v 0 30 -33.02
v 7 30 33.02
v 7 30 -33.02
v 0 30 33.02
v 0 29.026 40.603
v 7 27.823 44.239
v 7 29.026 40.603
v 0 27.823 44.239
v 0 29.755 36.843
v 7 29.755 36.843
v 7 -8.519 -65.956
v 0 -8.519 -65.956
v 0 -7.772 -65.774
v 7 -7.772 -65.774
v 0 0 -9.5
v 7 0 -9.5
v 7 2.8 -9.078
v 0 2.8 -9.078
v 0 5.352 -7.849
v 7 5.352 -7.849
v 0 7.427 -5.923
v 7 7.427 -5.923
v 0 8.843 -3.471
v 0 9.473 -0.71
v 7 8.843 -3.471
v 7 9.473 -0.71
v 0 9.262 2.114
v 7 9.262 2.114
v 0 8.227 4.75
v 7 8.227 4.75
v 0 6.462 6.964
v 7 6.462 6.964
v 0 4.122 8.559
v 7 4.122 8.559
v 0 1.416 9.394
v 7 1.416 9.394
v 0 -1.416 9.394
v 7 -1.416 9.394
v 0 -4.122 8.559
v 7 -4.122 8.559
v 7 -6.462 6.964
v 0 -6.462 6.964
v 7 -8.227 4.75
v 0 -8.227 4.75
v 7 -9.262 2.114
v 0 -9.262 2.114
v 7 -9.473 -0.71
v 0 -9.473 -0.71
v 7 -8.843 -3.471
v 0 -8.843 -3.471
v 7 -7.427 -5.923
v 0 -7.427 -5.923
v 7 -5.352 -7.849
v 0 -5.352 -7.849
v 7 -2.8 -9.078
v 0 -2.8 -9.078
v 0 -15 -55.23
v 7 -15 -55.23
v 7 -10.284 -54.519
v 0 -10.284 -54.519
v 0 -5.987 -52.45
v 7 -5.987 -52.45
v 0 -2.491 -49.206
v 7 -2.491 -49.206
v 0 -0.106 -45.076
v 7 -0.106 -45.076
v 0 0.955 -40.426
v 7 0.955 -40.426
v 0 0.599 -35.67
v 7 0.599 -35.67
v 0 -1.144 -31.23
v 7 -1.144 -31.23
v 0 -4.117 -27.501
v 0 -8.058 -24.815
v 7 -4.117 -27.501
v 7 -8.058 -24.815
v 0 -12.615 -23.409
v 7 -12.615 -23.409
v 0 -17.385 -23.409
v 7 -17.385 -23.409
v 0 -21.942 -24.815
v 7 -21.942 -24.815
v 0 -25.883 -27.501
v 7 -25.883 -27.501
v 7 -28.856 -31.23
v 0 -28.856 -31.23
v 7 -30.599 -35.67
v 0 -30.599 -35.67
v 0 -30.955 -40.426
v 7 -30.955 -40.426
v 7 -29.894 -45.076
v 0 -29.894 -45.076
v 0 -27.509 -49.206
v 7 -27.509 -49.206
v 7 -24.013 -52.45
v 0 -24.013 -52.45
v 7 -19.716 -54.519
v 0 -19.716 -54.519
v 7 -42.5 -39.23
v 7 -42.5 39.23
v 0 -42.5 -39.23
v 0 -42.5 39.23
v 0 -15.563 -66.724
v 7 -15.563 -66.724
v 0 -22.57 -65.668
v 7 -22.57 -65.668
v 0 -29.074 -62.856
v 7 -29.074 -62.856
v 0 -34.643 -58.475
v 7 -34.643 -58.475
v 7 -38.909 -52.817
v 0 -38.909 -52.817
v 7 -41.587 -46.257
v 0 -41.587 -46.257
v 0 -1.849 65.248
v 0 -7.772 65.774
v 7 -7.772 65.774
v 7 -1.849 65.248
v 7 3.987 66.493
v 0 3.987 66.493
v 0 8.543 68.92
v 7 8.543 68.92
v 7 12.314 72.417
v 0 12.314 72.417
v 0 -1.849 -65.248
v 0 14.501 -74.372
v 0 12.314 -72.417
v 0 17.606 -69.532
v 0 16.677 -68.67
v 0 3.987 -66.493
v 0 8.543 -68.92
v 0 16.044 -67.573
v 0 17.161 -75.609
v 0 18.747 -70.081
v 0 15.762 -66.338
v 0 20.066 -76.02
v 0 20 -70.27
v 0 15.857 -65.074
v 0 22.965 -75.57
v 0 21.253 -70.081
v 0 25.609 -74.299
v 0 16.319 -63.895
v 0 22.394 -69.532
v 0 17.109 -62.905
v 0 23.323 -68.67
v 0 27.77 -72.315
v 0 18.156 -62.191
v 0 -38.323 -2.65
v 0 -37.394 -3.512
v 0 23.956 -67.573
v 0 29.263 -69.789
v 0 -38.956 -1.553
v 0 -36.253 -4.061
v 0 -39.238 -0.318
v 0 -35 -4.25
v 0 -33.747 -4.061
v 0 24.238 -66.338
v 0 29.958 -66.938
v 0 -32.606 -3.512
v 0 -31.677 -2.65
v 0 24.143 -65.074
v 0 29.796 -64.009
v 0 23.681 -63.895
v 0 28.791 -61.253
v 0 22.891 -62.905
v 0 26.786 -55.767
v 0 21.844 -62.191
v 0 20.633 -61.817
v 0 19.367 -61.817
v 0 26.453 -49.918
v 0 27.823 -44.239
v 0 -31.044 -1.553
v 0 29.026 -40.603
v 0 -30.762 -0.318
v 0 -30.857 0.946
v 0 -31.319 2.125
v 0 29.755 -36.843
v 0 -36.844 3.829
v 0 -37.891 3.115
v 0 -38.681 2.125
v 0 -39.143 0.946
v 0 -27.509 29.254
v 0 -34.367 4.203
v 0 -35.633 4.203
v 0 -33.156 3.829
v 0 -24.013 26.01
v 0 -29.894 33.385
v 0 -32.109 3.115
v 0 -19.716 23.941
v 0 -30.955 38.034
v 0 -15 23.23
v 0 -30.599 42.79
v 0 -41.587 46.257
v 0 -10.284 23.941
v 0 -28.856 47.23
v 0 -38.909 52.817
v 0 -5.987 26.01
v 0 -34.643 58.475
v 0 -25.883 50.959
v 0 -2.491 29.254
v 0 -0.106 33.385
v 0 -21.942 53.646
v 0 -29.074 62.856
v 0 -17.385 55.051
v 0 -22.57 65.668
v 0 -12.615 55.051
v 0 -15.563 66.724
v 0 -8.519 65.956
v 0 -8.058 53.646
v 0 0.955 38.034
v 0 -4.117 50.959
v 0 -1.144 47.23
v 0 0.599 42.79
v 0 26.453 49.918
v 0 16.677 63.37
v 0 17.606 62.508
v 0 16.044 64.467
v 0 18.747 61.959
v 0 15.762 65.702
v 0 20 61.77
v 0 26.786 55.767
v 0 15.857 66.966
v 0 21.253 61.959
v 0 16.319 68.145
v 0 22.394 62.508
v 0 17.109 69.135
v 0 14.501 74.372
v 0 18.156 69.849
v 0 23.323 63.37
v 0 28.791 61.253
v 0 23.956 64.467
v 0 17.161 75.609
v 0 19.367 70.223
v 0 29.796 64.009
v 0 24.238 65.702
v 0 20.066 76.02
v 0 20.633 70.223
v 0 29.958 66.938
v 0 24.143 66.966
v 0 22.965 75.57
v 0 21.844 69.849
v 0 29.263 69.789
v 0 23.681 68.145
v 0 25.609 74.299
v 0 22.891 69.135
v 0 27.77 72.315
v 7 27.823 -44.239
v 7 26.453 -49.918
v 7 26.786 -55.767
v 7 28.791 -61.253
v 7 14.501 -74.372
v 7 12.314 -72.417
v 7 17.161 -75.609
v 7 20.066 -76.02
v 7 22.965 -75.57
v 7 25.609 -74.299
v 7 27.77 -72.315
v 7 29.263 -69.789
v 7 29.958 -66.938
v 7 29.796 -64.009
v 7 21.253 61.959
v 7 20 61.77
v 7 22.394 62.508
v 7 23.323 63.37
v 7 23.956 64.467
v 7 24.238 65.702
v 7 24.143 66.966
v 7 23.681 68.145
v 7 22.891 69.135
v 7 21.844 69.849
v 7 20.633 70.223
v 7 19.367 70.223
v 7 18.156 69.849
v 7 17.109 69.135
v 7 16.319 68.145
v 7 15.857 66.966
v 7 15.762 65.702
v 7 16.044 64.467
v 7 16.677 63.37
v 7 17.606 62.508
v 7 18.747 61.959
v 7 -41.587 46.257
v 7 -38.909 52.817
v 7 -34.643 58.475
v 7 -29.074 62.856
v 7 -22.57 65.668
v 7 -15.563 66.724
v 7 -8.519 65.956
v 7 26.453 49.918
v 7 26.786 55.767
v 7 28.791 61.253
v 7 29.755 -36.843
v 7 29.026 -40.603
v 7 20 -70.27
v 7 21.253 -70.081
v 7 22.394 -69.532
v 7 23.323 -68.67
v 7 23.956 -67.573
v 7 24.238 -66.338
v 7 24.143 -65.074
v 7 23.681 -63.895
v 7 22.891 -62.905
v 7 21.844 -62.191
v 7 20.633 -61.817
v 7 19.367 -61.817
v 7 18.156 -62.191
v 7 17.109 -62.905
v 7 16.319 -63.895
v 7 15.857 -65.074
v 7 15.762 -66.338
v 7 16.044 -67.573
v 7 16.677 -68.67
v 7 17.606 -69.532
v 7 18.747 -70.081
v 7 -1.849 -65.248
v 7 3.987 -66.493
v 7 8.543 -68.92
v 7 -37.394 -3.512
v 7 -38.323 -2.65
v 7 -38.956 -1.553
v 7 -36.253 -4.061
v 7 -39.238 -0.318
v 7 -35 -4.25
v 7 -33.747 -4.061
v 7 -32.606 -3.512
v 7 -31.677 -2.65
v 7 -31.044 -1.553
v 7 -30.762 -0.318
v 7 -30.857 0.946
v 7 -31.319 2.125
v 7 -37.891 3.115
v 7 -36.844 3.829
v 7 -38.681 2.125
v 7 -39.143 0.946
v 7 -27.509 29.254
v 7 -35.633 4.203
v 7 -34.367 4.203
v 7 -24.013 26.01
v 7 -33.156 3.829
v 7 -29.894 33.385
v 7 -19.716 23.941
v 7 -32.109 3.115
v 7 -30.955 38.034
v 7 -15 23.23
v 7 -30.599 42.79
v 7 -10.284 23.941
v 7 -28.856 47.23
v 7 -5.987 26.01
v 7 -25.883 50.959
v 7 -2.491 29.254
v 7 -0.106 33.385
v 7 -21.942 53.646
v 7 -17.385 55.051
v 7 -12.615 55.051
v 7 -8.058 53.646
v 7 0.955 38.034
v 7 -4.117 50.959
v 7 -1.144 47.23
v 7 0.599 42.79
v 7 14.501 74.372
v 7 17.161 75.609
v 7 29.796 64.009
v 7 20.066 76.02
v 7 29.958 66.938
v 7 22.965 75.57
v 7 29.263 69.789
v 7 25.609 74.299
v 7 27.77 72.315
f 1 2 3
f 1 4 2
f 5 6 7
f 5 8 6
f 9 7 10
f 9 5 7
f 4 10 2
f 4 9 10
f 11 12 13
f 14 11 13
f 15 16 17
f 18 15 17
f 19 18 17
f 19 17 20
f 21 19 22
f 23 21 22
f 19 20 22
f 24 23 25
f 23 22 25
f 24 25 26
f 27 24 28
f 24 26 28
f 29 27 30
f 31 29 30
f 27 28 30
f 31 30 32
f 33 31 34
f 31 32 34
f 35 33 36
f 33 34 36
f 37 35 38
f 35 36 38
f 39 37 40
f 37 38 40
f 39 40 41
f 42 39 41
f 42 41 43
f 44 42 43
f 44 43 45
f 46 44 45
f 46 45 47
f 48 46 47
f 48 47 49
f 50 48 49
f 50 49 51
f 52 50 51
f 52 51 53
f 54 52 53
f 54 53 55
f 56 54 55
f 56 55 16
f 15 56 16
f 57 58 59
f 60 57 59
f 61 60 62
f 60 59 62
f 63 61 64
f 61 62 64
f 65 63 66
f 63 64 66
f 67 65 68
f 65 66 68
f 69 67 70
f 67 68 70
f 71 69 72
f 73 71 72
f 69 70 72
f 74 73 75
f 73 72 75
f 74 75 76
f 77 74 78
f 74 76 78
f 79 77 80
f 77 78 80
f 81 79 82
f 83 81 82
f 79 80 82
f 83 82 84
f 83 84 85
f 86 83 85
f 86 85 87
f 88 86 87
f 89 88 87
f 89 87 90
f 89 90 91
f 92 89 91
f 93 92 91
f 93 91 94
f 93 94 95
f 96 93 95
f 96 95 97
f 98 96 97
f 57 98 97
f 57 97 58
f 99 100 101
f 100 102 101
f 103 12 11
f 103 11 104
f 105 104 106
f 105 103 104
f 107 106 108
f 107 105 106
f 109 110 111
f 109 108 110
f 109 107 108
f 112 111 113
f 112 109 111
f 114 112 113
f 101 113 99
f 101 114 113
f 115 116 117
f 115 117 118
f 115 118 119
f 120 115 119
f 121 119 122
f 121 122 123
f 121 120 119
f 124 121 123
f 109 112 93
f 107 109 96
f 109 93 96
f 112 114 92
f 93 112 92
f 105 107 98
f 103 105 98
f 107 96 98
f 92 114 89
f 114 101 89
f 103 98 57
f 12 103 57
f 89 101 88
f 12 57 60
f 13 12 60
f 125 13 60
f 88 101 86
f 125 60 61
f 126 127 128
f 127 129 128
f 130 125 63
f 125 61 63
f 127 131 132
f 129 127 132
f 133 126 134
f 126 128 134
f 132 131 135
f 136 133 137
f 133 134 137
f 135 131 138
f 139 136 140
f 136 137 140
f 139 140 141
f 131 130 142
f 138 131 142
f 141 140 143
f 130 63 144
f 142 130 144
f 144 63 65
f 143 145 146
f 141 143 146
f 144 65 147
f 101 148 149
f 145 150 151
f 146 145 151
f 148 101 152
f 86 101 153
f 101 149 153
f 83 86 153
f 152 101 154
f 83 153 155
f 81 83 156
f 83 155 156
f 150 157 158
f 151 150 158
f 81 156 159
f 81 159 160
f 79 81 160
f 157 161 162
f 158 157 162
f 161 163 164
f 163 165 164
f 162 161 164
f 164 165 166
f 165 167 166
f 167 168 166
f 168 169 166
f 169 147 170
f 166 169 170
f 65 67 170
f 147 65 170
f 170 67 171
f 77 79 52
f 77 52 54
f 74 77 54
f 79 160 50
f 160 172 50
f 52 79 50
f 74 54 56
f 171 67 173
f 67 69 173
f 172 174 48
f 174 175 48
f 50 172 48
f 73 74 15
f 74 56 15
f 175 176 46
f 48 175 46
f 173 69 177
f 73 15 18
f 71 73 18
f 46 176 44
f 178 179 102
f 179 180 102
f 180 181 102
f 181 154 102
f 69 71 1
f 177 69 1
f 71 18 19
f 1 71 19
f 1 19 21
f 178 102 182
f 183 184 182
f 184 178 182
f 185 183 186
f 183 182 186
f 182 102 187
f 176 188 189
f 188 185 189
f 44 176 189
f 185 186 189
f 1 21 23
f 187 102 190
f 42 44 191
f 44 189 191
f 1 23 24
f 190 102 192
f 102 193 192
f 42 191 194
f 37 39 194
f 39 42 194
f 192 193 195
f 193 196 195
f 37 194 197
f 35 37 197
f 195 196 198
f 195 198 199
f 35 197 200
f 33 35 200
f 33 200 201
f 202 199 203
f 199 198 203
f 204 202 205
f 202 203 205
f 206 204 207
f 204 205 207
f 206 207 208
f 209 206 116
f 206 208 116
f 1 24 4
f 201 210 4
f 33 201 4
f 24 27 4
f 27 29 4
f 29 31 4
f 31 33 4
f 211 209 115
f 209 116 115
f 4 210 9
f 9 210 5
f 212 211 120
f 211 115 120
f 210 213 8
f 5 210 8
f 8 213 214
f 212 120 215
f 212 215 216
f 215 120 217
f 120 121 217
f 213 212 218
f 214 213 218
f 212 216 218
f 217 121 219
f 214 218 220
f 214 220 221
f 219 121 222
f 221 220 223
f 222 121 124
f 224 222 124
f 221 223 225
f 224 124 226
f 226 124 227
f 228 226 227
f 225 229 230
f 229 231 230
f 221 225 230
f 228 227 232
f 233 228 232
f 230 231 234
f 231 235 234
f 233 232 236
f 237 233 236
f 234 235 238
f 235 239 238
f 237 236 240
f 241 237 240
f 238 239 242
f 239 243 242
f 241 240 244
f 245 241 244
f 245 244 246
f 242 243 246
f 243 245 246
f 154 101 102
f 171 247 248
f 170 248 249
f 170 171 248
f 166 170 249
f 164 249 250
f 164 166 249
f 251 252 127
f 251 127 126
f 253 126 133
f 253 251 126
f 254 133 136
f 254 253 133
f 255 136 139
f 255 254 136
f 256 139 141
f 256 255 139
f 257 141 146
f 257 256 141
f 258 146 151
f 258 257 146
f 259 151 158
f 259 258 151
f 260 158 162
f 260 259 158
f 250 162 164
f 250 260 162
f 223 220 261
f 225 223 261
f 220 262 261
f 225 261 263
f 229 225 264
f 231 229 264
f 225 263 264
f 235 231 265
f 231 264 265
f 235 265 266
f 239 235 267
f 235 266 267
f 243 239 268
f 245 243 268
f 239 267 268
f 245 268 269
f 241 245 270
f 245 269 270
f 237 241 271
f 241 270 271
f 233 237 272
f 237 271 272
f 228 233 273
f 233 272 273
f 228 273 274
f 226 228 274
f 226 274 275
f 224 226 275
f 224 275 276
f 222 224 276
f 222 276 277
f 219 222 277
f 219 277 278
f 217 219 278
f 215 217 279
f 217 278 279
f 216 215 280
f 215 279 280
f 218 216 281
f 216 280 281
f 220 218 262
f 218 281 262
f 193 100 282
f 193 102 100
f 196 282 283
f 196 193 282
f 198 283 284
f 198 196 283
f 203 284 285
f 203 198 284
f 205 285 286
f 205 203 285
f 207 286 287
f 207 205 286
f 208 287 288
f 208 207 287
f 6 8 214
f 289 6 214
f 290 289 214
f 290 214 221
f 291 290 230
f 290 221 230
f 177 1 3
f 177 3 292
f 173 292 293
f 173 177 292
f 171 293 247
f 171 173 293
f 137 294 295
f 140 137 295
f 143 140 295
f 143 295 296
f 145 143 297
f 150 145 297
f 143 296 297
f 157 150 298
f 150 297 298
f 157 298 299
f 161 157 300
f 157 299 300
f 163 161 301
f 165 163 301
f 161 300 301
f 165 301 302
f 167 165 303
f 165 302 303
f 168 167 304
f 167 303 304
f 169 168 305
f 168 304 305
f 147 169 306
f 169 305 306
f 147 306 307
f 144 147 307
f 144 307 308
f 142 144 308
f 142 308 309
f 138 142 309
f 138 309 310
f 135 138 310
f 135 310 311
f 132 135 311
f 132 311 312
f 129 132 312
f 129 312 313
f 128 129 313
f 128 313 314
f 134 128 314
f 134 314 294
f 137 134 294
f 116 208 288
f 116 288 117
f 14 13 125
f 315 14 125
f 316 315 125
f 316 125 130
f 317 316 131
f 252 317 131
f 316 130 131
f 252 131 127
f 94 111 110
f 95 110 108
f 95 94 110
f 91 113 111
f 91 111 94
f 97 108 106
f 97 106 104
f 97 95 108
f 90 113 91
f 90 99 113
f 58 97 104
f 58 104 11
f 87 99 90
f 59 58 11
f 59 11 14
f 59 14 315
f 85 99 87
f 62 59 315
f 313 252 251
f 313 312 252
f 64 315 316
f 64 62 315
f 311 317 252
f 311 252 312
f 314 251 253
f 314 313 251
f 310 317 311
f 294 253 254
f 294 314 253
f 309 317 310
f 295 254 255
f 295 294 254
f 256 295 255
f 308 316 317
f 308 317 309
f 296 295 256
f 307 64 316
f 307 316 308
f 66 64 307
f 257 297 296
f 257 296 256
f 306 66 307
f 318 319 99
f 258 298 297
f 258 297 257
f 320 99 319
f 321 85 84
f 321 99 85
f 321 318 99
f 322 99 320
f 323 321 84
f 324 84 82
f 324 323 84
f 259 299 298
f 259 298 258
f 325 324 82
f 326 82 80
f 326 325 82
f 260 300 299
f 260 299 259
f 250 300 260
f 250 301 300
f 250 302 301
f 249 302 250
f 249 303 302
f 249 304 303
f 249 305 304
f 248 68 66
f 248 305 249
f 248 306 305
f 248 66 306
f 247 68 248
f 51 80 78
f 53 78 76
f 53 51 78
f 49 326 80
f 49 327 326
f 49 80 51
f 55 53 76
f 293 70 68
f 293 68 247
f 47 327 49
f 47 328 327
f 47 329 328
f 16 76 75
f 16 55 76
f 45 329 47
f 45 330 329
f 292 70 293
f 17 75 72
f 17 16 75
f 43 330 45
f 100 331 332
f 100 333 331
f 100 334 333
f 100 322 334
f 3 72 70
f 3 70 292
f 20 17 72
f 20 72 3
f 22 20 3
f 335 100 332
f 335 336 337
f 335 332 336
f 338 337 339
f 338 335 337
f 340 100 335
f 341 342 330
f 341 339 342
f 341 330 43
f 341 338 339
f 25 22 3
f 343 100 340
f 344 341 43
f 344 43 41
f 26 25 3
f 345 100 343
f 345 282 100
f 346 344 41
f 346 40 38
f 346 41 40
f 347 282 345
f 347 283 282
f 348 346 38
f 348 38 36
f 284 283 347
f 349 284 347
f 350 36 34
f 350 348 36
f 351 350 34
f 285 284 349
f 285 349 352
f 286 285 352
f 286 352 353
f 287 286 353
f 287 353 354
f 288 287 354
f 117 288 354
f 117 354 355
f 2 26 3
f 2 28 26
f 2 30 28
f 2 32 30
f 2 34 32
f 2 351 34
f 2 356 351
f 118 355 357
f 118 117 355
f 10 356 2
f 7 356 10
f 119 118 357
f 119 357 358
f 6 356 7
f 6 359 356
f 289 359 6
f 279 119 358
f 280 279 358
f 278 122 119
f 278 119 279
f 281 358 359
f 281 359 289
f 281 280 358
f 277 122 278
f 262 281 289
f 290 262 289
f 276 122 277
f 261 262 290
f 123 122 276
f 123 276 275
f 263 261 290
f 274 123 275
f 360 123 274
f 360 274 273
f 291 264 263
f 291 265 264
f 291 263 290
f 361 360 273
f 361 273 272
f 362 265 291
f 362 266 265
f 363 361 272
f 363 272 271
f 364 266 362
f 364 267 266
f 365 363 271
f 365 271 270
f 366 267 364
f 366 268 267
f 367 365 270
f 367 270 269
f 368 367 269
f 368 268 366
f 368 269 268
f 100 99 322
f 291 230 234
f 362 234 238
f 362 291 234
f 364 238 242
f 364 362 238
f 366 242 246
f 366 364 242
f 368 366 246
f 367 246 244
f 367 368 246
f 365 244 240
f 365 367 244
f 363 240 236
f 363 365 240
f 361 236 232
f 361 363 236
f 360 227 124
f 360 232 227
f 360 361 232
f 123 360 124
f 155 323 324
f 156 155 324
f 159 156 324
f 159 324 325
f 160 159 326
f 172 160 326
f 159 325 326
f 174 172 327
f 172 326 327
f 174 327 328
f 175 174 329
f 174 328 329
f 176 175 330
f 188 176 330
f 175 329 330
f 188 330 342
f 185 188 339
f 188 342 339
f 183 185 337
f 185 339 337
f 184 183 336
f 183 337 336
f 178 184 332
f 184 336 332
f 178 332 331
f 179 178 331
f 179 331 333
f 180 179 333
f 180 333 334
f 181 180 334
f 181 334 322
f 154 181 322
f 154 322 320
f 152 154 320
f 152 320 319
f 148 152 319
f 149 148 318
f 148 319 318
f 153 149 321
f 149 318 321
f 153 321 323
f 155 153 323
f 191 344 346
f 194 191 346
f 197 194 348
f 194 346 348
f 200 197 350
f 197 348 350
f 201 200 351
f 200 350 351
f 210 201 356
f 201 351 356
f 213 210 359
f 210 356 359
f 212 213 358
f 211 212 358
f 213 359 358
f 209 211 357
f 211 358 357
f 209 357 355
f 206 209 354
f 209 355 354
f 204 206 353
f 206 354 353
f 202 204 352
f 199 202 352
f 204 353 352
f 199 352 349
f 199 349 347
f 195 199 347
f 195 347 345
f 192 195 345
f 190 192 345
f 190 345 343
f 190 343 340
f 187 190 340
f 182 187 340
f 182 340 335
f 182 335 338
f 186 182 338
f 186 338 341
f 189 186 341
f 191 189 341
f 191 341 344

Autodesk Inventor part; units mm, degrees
ref_plane "YZ Plane" through (0, 0, 0) normal (1, 0, 0) x (0, 1, 0)
ref_plane "XZ Plane" through (0, 0, 0) normal (0, 1, 0) x (-1, 0, 0)
ref_plane "XY Plane" through (0, 0, 0) normal (0, 0, 1) x (1, 0, 0)
sketch "Sketch6" plane through (0, 0, 0) normal (1, 0, 0) x (0, 1, 0)
  circle A0 centre (0, 0) radius 9.5
  circle A1 centre (-15, -39.2301) radius 16
  circle A2 centre (-15, 39.2301) radius 16
  line L0 (0, 0) -> (0, -14.5947) construction
  line L1 (0, 0) -> (0, -33.02)
  line L2 (0, 0) -> (33.02, 0) construction
  circle A3 centre (0, -33.02) radius 30
  line L3 (0, 0) -> (0, 33.02)
  line L4 (0, 0) -> (33.02, 0) construction
  circle A4 centre (0, 33.02) radius 30
  line L5 (0, 0) -> (-15, -39.2301)
  line L6 (0, 0) -> (-15, 39.2301)
  circle A5 centre (-15, 39.2301) radius 27.5
  circle A6 centre (-15, -39.2301) radius 27.5
  line L7 (30, 33.02) -> (30, -33.02)
  line L8 (-42.5, 39.2301) -> (-42.5, -39.2301)
  line L9 (-8.5189, 65.9555) -> (7.0703, 62.1749)
  line L10 (-8.5189, -65.9555) -> (7.0703, -62.1749)
  dimension "d45" = 19
  dimension "d46" = 32
  dimension "d47" = 32
  dimension "d50" = 15
  dimension "d51" = 15
  dimension "d52" = 33.02
  dimension "d53" = 90
  dimension "d54" = 60
  dimension "d55" = 33.02
  dimension "d56" = 90
  dimension "d57" = 60
  dimension "d58" = 42
  dimension "d59" = 42
  dimension "d60" = 55
  dimension "d61" = 55
extrude "Extrusion6" add sketch "Sketch6" along normal blind 7
sketch "Sketch7" plane through (7, 0, 0) normal (1, 0, 0) x (0, 0, -1)
  circle A0 centre (0, 0) radius 9.5
  circle A1 centre (39.2301, -15) radius 16
  circle A2 centre (-39.2301, -15) radius 16
  line L0 (0, 0) -> (39.2301, -15) construction
  line L1 (0, 0) -> (-39.2301, -15) construction
  dimension "d64" = 19
  dimension "d65" = 32
  dimension "d66" = 32
  dimension "d67" = 15
  dimension "d69" = 15
  dimension "d70" = 42
  dimension "d71" = 42
extrude "Extrusion7" cut sketch "Sketch7" against normal blind 10
sketch "Sketch8" plane through (7, 0, 0) normal (1, 0, 0) x (0, 0, -1)
  circle A0 centre (-66.02, 20) radius 4.25 projected
  circle A1 centre (66.02, 20) radius 4.25 projected
  circle A2 centre (0, -35) radius 4.25 projected
  circle A3 centre (-66.02, 20) radius 10
  circle A4 centre (66.02, 20) radius 10
  circle A5 centre (0, -35) radius 8
  point P0 (0, 0)
  dimension "d74" = 20
  dimension "d75" = 20
  dimension "d76" = 16
extrude "Extrusion8" add sketch "Sketch8" against normal blind 7 contours A3 | A4
fillet "Fillet3" radius 20 4 edges at (3.5, 19.2254, 56.05) (3.5, 11.52, 60.72) (3.5, 19.2254, -56.05) (3.5, 11.52, -60.72)
sketch "Sketch9" plane through (7, 0, 0) normal (1, 0, 0) x (0, 0, -1)
  circle A0 centre (0, -35) radius 4.25 projected
  point P0 (0, 0)
extrude "Extrusion9" cut sketch "Sketch9" against normal blind 10
properties part number "Gearbox Plate 1" material "Aluminum 6061"
